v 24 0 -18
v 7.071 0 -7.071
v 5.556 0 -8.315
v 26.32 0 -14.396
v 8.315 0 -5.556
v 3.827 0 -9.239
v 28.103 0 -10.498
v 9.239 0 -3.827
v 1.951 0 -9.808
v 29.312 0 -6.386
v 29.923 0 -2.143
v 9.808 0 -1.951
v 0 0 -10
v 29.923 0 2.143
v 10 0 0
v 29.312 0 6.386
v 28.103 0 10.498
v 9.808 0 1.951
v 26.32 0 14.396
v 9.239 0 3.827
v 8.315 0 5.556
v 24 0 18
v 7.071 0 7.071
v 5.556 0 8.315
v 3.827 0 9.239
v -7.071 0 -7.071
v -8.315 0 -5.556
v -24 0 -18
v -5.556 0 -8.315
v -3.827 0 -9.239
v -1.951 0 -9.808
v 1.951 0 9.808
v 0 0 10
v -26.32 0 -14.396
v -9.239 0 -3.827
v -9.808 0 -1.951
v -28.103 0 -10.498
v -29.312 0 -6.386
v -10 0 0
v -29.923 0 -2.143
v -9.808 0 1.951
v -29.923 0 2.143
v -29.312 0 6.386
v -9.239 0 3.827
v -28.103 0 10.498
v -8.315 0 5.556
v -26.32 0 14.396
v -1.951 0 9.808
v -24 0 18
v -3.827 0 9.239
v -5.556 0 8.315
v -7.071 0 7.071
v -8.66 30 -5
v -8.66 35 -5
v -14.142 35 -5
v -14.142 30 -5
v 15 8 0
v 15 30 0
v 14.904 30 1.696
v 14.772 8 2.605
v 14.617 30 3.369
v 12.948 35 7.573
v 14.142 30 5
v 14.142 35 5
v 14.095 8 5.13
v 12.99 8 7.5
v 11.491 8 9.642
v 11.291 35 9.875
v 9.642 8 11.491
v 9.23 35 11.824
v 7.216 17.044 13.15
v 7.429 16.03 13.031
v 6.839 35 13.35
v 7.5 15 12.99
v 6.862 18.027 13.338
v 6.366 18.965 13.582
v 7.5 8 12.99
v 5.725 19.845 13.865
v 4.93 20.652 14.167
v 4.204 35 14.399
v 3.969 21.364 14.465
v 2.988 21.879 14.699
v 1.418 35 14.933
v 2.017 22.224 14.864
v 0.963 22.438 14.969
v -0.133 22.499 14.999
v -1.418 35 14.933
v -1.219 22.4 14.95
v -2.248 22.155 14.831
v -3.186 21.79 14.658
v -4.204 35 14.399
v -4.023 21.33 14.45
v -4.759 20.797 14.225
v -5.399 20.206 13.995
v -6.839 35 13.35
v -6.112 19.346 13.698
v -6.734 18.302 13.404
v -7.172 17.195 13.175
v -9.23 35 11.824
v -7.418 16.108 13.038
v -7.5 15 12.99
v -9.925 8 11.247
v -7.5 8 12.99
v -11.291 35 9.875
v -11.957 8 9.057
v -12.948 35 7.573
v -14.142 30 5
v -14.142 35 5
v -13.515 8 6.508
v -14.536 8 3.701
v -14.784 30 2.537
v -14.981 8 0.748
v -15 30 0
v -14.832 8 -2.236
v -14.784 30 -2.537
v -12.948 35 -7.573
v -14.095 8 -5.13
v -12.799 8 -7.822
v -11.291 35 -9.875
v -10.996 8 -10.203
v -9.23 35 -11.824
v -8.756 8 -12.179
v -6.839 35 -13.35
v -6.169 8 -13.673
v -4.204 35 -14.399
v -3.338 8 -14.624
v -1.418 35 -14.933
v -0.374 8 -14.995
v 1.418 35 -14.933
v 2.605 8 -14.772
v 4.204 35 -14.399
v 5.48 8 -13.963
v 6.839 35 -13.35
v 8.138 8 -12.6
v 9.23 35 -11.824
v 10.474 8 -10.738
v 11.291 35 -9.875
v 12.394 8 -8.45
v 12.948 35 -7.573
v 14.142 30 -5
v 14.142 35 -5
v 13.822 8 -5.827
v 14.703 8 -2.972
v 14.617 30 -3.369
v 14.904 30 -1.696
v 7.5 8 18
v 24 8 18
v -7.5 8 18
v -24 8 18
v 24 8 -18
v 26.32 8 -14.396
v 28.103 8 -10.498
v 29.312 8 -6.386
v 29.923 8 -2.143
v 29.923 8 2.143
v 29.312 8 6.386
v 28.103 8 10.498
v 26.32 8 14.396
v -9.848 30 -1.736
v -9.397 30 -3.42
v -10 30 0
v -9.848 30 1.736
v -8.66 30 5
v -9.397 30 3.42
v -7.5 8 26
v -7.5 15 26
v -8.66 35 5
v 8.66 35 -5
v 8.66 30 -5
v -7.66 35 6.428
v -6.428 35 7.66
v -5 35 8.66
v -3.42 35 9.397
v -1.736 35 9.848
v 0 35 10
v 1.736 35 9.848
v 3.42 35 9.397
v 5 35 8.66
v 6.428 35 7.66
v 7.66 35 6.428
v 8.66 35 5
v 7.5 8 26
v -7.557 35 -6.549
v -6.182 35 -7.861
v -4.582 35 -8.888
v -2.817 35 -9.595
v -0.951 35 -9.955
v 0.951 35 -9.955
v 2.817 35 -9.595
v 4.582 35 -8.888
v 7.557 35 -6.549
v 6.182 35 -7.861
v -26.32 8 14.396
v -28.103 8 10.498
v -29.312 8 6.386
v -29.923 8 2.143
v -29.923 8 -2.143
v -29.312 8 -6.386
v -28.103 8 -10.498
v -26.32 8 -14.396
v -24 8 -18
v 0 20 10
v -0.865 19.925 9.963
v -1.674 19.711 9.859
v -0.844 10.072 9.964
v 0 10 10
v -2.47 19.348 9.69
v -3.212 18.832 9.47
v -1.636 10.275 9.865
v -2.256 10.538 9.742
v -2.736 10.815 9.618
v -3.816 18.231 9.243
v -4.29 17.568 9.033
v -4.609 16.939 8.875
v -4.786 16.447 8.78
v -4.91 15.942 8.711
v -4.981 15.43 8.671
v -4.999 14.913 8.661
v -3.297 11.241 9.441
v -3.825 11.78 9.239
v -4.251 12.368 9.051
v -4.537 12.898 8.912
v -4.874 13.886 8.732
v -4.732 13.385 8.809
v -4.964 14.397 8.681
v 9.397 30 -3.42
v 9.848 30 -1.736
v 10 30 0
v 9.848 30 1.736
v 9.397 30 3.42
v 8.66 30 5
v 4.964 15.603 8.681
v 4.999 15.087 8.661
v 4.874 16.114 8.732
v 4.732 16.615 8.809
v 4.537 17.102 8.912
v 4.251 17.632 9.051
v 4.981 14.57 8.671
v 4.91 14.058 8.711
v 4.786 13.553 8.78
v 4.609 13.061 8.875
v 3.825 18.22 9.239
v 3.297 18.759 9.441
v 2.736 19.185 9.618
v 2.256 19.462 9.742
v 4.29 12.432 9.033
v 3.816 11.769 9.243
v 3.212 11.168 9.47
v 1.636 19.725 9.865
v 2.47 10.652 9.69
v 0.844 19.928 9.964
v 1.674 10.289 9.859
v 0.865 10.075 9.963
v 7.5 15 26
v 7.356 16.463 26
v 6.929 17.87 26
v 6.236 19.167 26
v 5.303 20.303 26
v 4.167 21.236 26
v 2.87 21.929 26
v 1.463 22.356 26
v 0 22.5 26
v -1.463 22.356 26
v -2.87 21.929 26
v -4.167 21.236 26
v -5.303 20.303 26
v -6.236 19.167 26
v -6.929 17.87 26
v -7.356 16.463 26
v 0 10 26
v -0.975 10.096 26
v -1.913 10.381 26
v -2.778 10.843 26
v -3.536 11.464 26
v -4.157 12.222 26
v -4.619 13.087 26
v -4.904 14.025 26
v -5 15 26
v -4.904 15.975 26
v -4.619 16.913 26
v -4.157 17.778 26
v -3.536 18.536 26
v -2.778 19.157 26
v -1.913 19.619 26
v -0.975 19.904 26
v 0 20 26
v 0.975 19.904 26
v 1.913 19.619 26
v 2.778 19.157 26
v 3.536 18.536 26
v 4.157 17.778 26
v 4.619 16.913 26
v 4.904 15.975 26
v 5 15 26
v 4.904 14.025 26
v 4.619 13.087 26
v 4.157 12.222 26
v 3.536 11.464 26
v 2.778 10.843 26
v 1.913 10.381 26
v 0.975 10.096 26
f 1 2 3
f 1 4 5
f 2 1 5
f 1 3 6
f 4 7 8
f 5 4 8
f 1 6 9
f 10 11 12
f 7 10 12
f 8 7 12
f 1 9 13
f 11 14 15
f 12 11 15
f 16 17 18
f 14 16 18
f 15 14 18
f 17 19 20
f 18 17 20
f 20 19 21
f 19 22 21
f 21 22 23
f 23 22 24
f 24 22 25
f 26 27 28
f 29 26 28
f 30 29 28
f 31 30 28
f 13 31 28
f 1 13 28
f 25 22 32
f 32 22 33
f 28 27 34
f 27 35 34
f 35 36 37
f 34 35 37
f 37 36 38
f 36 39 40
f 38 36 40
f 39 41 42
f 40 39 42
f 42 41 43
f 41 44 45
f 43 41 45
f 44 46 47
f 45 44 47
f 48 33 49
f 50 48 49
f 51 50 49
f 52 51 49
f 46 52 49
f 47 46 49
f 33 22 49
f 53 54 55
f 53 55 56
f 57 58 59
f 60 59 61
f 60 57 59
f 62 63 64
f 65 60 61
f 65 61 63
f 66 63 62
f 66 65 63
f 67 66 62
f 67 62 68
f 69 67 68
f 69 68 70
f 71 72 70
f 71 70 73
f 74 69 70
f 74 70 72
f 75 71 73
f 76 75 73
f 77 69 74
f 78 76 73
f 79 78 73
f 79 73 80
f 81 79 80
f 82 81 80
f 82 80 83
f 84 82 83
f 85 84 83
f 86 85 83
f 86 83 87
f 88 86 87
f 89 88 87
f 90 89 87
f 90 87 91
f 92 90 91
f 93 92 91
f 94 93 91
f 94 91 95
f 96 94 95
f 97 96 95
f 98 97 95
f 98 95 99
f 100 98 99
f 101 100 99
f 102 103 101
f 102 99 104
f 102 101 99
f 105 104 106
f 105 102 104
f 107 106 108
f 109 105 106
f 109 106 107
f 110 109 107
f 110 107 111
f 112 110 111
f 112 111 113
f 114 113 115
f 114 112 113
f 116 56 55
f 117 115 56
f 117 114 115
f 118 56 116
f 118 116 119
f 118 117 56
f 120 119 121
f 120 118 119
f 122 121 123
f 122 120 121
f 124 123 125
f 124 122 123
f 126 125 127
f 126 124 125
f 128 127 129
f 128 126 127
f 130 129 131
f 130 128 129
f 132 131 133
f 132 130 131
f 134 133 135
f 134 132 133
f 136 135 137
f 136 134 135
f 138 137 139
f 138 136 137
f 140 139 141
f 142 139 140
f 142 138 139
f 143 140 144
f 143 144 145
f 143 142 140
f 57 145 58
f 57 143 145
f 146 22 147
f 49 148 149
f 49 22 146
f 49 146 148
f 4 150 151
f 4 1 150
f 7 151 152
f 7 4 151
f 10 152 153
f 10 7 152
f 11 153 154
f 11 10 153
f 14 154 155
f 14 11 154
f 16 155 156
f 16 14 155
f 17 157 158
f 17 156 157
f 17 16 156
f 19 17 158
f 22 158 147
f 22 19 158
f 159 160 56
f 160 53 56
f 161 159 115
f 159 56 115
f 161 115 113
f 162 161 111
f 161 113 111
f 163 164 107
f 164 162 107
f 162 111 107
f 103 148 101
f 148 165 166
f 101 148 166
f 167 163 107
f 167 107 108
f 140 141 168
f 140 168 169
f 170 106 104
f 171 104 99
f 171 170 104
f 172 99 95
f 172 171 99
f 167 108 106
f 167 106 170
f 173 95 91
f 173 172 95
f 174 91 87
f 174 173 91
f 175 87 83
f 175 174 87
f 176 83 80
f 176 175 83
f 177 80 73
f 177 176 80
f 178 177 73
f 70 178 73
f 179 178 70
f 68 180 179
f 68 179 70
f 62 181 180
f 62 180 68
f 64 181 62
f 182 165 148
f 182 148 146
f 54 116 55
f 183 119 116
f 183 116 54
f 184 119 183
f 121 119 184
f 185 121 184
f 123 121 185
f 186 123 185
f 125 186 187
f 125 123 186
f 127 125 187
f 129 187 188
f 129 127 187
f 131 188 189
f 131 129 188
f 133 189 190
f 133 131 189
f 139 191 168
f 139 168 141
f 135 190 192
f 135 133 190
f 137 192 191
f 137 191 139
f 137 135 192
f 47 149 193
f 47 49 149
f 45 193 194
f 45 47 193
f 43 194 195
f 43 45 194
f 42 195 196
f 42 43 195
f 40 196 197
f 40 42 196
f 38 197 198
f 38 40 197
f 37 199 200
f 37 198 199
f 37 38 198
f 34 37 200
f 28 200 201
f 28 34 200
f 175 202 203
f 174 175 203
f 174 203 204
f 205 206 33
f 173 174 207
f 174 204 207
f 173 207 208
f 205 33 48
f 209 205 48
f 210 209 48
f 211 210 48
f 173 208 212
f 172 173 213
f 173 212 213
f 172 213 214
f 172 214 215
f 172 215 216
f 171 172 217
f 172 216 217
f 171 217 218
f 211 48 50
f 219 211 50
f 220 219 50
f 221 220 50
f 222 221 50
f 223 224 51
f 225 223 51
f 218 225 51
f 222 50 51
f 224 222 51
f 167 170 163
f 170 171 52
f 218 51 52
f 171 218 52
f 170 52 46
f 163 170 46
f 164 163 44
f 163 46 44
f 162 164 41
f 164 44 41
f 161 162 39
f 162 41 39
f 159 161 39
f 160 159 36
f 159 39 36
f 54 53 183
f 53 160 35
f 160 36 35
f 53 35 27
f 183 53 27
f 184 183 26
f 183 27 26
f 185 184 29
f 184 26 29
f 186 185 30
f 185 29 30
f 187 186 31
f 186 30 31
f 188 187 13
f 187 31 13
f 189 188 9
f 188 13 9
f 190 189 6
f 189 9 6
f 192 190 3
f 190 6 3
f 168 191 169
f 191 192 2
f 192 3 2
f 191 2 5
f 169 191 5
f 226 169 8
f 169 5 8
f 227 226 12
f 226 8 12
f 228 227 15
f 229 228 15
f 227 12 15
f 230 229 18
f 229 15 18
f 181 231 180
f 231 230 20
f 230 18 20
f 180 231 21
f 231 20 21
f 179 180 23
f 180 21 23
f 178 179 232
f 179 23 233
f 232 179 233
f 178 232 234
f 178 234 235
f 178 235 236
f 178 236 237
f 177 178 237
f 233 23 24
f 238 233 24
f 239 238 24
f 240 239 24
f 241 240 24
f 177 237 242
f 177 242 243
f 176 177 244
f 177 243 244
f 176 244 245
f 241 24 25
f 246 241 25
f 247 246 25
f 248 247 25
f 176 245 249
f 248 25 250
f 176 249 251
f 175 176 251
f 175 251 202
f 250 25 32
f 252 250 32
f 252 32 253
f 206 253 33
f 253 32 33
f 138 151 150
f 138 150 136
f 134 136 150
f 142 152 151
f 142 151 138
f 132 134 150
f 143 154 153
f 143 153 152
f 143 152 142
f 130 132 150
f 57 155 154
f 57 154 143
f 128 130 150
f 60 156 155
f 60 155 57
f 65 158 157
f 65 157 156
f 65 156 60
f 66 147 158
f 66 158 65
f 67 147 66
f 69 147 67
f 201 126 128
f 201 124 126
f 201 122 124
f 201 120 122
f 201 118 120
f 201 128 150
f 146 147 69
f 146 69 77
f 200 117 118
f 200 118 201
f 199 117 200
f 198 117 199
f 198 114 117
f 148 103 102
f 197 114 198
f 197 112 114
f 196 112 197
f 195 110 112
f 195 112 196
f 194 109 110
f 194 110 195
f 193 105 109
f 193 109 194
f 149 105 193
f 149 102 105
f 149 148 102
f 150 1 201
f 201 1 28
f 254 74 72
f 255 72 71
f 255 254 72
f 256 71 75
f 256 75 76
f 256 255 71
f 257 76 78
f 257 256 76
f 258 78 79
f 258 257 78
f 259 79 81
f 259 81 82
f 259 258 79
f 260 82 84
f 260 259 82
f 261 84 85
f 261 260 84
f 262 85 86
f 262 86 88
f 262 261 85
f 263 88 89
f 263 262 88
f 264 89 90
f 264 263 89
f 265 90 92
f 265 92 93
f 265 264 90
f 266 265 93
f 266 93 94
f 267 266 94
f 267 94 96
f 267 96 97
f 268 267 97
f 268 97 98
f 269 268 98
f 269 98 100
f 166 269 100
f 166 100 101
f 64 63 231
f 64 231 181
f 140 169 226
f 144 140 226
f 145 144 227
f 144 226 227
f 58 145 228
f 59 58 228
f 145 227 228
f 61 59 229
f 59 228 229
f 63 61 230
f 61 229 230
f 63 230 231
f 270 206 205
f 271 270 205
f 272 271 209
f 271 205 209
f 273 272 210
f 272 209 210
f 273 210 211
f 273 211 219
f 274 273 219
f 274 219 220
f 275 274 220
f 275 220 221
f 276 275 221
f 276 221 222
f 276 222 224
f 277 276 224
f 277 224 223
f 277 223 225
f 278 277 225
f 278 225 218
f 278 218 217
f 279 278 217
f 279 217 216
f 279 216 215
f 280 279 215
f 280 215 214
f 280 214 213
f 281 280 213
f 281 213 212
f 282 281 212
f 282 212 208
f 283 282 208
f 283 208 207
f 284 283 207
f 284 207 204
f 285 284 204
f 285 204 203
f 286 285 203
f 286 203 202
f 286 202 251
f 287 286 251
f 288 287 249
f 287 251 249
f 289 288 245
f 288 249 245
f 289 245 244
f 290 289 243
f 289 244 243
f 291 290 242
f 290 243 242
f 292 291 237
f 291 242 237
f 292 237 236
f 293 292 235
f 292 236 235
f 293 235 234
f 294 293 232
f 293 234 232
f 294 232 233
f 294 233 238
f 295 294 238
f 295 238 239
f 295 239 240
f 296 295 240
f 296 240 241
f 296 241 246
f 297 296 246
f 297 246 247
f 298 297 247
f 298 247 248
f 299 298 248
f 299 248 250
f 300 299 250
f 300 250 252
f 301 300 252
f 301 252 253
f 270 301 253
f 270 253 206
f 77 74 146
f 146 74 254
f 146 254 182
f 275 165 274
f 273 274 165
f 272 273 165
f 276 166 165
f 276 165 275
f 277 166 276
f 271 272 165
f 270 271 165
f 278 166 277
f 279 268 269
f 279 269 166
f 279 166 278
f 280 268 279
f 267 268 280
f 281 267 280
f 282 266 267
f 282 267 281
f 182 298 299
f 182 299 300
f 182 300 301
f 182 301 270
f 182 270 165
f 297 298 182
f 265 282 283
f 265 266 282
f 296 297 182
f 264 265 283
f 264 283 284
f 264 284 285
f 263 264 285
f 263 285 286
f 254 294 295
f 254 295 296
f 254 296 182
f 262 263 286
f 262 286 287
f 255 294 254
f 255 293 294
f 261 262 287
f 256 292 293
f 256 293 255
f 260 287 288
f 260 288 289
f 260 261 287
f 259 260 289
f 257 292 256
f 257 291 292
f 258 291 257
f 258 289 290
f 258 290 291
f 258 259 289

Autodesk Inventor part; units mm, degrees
ref_plane "YZ Plane" through (0, 0, 0) normal (1, 0, 0) x (0, 1, 0)
ref_plane "XZ Plane" through (0, 0, 0) normal (0, 1, 0) x (-1, 0, 0)
ref_plane "XY Plane" through (0, 0, 0) normal (0, 0, 1) x (1, 0, 0)
sketch "草图1" plane through (0, 0, 0) normal (0, 1, 0) x (-1, 0, 0)
  line L0 (-24, 18) -> (24, 18)
  line L1 (24, 0) -> (39.8795, 0) construction
  line L2 (-24, -18) -> (24, -18)
  arc A0 (-24, 18) -> (-24, -18) centre (0, 0) ccw
  arc A1 (24, -18) -> (24, 18) centre (0, 0) ccw
  dimension "d9" = 18
  dimension "d10" = 30
extrude "拉伸1" add sketch "草图1" along normal blind 8
sketch "草图2" plane through (0, 8, 0) normal (0, 1, 0) x (1, 0, 0)
  arc A0 (-24, 18) -> (-24, -18) centre (0, 0) ccw projected
  circle A1 centre (0, 0) radius 15
  dimension "d13" = 30
extrude "拉伸2" add sketch "草图2" along normal blind 27
hole "孔1" at (0, 35, 0) direction (0, -1, 0) diameter 20 end through all
ref_plane "工作平面1" through (-24, 0, 26) normal (0, 0, 1) x (1, 0, 0)
sketch "草图3" plane through (-24, 0, 26) normal (0, 0, 1) x (1, 0, 0)
  line L0 (0, 8) -> (48, 8) projected
  line L1 (16.5, 8) -> (16.5, 15)
  arc A0 (31.5, 15) -> (16.5, 15) centre (24, 15) ccw
  line L2 (31.5, 15) -> (31.5, 8)
  point P0 (24, 0)
  dimension "d27" = 7
  dimension "d29" = 7.5
extrude "拉伸3" add sketch "草图3" against normal up to surface
hole "孔2" at (0, 15, 26) direction (0, 0, -1) diameter 10 end up to surface
sketch "草图4" plane through (0, 0, 0) normal (1, 0, 0) x (0, 1, 0)
  line L0 (35, 10) -> (35, -10) projected
  line L1 (30, 5) -> (35, 5)
  line L2 (35, 5) -> (35, -5)
  line L3 (35, -5) -> (30, -5)
  line L4 (30, -5) -> (30, 5)
  line L5 (6.6641, 0) -> (11.8794, 0) construction
  point P0 (0, 0)
  dimension "d41" = 5
  dimension "d43" = 10
extrude "拉伸4" cut sketch "草图4" along normal through all both and the other way through all
properties part number "第一次上机-模型3（改）"
